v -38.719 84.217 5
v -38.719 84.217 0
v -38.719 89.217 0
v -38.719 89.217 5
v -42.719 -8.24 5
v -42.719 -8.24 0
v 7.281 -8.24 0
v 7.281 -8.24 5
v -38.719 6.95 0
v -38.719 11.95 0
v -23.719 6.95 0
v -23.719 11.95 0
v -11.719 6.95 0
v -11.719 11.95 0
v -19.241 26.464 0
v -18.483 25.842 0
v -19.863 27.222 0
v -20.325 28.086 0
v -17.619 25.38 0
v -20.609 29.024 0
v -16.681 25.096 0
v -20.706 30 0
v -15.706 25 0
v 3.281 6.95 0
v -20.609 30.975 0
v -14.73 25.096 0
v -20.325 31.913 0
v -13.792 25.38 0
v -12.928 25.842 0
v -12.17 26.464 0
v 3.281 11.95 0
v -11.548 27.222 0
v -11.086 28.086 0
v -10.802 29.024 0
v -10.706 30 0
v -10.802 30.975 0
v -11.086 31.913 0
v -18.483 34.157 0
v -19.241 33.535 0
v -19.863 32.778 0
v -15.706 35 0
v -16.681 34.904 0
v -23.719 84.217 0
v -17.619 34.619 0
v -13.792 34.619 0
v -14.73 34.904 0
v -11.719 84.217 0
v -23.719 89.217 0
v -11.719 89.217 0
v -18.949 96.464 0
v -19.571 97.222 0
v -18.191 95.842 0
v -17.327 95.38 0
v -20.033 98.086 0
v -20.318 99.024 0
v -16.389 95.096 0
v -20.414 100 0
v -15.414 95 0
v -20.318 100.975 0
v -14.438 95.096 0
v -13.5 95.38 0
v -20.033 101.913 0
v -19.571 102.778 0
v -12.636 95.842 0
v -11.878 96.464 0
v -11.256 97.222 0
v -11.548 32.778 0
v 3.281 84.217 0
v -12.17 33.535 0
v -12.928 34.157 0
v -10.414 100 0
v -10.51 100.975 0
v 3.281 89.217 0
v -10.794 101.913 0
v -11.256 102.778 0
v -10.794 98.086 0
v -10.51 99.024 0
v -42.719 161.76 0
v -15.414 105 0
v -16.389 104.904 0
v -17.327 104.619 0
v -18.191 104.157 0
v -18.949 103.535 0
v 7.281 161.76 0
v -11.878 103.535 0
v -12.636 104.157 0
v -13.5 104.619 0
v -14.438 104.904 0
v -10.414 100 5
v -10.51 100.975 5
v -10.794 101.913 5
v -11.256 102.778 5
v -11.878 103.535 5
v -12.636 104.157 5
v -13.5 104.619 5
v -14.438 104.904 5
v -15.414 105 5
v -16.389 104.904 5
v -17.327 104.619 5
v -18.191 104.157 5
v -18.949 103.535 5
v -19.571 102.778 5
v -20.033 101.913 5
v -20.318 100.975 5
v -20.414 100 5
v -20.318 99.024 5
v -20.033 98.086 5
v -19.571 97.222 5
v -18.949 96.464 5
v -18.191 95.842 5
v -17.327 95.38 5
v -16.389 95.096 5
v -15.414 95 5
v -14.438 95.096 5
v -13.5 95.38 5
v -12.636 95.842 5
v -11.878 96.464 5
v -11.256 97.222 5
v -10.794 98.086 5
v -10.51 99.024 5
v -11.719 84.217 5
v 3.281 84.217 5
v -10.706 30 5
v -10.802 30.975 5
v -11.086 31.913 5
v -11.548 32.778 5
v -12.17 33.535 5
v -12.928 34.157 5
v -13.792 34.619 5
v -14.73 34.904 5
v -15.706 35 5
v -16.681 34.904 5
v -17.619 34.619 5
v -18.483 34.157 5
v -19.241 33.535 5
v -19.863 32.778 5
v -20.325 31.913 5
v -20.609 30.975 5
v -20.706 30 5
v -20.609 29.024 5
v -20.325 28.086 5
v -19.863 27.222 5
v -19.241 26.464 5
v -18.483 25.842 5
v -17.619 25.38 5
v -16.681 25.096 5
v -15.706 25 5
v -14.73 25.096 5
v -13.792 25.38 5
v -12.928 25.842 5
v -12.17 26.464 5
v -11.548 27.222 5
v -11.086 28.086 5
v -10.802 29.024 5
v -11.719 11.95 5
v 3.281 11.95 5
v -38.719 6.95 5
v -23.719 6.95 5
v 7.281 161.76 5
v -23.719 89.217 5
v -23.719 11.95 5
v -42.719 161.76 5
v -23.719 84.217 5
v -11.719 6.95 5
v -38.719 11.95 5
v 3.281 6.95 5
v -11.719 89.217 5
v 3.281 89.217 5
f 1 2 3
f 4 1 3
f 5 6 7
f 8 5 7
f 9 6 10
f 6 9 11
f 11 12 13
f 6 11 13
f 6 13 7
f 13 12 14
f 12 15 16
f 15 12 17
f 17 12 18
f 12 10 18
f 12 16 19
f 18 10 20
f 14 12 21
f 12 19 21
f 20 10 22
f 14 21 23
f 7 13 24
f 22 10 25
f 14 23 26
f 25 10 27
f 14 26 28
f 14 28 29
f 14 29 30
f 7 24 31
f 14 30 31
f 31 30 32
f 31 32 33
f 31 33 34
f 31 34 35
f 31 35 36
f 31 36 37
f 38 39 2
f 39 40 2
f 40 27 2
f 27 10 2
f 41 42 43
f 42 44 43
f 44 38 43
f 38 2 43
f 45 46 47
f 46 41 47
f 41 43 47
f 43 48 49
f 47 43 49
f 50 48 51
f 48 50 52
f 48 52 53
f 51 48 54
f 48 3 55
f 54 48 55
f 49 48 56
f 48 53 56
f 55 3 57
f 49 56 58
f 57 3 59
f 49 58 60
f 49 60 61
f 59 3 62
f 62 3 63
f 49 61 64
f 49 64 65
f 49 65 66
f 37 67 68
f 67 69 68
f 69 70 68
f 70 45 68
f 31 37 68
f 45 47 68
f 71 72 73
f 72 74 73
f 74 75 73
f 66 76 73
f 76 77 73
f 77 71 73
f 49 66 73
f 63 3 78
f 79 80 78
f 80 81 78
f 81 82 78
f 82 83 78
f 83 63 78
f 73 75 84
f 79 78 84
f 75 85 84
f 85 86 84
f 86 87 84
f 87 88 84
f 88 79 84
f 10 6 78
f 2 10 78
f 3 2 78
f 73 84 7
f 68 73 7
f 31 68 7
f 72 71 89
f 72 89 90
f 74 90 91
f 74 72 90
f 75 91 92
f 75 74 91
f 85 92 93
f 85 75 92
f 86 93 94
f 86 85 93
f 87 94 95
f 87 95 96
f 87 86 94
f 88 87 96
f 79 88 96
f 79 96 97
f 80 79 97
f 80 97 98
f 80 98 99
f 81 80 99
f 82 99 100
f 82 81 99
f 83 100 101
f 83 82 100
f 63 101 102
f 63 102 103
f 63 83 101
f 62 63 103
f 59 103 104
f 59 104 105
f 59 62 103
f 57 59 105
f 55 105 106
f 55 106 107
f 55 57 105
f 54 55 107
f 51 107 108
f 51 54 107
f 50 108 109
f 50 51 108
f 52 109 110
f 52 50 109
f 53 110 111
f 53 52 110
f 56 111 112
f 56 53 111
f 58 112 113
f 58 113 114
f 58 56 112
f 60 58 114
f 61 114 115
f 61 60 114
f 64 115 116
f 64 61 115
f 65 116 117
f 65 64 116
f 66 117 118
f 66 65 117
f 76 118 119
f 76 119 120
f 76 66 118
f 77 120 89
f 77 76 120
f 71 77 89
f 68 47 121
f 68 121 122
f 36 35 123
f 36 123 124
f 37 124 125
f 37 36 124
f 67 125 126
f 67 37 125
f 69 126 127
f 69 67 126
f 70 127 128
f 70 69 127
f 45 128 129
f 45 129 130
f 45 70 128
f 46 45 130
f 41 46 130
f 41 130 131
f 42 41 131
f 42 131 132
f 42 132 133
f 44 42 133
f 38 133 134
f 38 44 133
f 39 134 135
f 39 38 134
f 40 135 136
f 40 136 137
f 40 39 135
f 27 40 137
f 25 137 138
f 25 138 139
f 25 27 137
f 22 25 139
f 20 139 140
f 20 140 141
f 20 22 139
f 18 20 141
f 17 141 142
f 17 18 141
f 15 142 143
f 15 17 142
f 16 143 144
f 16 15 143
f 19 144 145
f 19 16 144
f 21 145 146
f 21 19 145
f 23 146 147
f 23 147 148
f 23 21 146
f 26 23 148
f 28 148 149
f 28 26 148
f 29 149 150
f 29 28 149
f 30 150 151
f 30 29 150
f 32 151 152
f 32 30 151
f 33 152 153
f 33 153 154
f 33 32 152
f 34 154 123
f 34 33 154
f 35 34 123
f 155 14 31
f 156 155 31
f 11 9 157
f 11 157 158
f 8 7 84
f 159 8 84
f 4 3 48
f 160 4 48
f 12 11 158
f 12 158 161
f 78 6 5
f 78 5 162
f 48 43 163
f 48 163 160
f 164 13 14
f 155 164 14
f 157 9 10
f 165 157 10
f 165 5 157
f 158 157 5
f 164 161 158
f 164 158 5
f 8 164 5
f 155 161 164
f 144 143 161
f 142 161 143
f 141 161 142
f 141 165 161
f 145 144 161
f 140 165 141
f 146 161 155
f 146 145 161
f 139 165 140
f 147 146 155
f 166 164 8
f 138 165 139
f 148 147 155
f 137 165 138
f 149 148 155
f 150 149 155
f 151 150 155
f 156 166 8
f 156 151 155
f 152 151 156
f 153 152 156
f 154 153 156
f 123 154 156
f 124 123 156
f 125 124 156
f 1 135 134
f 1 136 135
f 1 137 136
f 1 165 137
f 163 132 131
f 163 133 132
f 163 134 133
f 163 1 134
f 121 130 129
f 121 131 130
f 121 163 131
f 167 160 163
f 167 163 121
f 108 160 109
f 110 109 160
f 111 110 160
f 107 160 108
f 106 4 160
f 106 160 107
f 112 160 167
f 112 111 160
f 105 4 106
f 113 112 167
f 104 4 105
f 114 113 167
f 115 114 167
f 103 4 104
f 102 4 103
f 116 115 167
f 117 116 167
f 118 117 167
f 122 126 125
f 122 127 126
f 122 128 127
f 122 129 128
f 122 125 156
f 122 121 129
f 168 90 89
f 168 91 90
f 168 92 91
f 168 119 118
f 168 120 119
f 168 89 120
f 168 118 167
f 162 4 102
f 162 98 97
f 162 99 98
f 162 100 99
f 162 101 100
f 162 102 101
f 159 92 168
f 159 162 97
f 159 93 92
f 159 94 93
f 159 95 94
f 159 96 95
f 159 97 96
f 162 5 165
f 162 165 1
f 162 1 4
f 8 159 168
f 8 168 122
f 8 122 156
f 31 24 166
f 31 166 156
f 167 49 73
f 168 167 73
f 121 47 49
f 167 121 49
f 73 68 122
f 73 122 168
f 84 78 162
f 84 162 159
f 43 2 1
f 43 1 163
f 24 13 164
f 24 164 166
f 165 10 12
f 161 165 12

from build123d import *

# Parameters (mm, degrees)
SKETCH1_W           = 50
SKETCH1_H           = 170
SKETCH1_R           = 5
SKETCH1_W_2         = 15
SKETCH1_H_2         = 5
BOSS_EXTRUDE1_DEPTH = 5


with BuildPart() as part:
    # Sketch1 → Boss-Extrude1 (new body)
    with BuildSketch(Plane.XY):
        with Locations((-17.719310928, 76.759780871)):
            Rectangle(SKETCH1_W, SKETCH1_H)
        with Locations((-15.705505676, 29.999739242)):
            Circle(SKETCH1_R, mode=Mode.SUBTRACT)
        with Locations((-15.413646235, 99.999739242)):
            Circle(SKETCH1_R, mode=Mode.SUBTRACT)
        with Locations((-31.219310928, 9.449835726)):
            Rectangle(SKETCH1_W_2, SKETCH1_H_2, mode=Mode.SUBTRACT)
        with Locations((-31.219310928, 86.716581053)):
            Rectangle(SKETCH1_W_2, SKETCH1_H_2, mode=Mode.SUBTRACT)
        with Locations((-4.219310928, 86.716581053)):
            Rectangle(SKETCH1_W_2, SKETCH1_H_2, mode=Mode.SUBTRACT)
        with Locations((-4.219310928, 9.449835726)):
            Rectangle(SKETCH1_W_2, SKETCH1_H_2, mode=Mode.SUBTRACT)
    extrude(amount=BOSS_EXTRUDE1_DEPTH)


solid = part.part
